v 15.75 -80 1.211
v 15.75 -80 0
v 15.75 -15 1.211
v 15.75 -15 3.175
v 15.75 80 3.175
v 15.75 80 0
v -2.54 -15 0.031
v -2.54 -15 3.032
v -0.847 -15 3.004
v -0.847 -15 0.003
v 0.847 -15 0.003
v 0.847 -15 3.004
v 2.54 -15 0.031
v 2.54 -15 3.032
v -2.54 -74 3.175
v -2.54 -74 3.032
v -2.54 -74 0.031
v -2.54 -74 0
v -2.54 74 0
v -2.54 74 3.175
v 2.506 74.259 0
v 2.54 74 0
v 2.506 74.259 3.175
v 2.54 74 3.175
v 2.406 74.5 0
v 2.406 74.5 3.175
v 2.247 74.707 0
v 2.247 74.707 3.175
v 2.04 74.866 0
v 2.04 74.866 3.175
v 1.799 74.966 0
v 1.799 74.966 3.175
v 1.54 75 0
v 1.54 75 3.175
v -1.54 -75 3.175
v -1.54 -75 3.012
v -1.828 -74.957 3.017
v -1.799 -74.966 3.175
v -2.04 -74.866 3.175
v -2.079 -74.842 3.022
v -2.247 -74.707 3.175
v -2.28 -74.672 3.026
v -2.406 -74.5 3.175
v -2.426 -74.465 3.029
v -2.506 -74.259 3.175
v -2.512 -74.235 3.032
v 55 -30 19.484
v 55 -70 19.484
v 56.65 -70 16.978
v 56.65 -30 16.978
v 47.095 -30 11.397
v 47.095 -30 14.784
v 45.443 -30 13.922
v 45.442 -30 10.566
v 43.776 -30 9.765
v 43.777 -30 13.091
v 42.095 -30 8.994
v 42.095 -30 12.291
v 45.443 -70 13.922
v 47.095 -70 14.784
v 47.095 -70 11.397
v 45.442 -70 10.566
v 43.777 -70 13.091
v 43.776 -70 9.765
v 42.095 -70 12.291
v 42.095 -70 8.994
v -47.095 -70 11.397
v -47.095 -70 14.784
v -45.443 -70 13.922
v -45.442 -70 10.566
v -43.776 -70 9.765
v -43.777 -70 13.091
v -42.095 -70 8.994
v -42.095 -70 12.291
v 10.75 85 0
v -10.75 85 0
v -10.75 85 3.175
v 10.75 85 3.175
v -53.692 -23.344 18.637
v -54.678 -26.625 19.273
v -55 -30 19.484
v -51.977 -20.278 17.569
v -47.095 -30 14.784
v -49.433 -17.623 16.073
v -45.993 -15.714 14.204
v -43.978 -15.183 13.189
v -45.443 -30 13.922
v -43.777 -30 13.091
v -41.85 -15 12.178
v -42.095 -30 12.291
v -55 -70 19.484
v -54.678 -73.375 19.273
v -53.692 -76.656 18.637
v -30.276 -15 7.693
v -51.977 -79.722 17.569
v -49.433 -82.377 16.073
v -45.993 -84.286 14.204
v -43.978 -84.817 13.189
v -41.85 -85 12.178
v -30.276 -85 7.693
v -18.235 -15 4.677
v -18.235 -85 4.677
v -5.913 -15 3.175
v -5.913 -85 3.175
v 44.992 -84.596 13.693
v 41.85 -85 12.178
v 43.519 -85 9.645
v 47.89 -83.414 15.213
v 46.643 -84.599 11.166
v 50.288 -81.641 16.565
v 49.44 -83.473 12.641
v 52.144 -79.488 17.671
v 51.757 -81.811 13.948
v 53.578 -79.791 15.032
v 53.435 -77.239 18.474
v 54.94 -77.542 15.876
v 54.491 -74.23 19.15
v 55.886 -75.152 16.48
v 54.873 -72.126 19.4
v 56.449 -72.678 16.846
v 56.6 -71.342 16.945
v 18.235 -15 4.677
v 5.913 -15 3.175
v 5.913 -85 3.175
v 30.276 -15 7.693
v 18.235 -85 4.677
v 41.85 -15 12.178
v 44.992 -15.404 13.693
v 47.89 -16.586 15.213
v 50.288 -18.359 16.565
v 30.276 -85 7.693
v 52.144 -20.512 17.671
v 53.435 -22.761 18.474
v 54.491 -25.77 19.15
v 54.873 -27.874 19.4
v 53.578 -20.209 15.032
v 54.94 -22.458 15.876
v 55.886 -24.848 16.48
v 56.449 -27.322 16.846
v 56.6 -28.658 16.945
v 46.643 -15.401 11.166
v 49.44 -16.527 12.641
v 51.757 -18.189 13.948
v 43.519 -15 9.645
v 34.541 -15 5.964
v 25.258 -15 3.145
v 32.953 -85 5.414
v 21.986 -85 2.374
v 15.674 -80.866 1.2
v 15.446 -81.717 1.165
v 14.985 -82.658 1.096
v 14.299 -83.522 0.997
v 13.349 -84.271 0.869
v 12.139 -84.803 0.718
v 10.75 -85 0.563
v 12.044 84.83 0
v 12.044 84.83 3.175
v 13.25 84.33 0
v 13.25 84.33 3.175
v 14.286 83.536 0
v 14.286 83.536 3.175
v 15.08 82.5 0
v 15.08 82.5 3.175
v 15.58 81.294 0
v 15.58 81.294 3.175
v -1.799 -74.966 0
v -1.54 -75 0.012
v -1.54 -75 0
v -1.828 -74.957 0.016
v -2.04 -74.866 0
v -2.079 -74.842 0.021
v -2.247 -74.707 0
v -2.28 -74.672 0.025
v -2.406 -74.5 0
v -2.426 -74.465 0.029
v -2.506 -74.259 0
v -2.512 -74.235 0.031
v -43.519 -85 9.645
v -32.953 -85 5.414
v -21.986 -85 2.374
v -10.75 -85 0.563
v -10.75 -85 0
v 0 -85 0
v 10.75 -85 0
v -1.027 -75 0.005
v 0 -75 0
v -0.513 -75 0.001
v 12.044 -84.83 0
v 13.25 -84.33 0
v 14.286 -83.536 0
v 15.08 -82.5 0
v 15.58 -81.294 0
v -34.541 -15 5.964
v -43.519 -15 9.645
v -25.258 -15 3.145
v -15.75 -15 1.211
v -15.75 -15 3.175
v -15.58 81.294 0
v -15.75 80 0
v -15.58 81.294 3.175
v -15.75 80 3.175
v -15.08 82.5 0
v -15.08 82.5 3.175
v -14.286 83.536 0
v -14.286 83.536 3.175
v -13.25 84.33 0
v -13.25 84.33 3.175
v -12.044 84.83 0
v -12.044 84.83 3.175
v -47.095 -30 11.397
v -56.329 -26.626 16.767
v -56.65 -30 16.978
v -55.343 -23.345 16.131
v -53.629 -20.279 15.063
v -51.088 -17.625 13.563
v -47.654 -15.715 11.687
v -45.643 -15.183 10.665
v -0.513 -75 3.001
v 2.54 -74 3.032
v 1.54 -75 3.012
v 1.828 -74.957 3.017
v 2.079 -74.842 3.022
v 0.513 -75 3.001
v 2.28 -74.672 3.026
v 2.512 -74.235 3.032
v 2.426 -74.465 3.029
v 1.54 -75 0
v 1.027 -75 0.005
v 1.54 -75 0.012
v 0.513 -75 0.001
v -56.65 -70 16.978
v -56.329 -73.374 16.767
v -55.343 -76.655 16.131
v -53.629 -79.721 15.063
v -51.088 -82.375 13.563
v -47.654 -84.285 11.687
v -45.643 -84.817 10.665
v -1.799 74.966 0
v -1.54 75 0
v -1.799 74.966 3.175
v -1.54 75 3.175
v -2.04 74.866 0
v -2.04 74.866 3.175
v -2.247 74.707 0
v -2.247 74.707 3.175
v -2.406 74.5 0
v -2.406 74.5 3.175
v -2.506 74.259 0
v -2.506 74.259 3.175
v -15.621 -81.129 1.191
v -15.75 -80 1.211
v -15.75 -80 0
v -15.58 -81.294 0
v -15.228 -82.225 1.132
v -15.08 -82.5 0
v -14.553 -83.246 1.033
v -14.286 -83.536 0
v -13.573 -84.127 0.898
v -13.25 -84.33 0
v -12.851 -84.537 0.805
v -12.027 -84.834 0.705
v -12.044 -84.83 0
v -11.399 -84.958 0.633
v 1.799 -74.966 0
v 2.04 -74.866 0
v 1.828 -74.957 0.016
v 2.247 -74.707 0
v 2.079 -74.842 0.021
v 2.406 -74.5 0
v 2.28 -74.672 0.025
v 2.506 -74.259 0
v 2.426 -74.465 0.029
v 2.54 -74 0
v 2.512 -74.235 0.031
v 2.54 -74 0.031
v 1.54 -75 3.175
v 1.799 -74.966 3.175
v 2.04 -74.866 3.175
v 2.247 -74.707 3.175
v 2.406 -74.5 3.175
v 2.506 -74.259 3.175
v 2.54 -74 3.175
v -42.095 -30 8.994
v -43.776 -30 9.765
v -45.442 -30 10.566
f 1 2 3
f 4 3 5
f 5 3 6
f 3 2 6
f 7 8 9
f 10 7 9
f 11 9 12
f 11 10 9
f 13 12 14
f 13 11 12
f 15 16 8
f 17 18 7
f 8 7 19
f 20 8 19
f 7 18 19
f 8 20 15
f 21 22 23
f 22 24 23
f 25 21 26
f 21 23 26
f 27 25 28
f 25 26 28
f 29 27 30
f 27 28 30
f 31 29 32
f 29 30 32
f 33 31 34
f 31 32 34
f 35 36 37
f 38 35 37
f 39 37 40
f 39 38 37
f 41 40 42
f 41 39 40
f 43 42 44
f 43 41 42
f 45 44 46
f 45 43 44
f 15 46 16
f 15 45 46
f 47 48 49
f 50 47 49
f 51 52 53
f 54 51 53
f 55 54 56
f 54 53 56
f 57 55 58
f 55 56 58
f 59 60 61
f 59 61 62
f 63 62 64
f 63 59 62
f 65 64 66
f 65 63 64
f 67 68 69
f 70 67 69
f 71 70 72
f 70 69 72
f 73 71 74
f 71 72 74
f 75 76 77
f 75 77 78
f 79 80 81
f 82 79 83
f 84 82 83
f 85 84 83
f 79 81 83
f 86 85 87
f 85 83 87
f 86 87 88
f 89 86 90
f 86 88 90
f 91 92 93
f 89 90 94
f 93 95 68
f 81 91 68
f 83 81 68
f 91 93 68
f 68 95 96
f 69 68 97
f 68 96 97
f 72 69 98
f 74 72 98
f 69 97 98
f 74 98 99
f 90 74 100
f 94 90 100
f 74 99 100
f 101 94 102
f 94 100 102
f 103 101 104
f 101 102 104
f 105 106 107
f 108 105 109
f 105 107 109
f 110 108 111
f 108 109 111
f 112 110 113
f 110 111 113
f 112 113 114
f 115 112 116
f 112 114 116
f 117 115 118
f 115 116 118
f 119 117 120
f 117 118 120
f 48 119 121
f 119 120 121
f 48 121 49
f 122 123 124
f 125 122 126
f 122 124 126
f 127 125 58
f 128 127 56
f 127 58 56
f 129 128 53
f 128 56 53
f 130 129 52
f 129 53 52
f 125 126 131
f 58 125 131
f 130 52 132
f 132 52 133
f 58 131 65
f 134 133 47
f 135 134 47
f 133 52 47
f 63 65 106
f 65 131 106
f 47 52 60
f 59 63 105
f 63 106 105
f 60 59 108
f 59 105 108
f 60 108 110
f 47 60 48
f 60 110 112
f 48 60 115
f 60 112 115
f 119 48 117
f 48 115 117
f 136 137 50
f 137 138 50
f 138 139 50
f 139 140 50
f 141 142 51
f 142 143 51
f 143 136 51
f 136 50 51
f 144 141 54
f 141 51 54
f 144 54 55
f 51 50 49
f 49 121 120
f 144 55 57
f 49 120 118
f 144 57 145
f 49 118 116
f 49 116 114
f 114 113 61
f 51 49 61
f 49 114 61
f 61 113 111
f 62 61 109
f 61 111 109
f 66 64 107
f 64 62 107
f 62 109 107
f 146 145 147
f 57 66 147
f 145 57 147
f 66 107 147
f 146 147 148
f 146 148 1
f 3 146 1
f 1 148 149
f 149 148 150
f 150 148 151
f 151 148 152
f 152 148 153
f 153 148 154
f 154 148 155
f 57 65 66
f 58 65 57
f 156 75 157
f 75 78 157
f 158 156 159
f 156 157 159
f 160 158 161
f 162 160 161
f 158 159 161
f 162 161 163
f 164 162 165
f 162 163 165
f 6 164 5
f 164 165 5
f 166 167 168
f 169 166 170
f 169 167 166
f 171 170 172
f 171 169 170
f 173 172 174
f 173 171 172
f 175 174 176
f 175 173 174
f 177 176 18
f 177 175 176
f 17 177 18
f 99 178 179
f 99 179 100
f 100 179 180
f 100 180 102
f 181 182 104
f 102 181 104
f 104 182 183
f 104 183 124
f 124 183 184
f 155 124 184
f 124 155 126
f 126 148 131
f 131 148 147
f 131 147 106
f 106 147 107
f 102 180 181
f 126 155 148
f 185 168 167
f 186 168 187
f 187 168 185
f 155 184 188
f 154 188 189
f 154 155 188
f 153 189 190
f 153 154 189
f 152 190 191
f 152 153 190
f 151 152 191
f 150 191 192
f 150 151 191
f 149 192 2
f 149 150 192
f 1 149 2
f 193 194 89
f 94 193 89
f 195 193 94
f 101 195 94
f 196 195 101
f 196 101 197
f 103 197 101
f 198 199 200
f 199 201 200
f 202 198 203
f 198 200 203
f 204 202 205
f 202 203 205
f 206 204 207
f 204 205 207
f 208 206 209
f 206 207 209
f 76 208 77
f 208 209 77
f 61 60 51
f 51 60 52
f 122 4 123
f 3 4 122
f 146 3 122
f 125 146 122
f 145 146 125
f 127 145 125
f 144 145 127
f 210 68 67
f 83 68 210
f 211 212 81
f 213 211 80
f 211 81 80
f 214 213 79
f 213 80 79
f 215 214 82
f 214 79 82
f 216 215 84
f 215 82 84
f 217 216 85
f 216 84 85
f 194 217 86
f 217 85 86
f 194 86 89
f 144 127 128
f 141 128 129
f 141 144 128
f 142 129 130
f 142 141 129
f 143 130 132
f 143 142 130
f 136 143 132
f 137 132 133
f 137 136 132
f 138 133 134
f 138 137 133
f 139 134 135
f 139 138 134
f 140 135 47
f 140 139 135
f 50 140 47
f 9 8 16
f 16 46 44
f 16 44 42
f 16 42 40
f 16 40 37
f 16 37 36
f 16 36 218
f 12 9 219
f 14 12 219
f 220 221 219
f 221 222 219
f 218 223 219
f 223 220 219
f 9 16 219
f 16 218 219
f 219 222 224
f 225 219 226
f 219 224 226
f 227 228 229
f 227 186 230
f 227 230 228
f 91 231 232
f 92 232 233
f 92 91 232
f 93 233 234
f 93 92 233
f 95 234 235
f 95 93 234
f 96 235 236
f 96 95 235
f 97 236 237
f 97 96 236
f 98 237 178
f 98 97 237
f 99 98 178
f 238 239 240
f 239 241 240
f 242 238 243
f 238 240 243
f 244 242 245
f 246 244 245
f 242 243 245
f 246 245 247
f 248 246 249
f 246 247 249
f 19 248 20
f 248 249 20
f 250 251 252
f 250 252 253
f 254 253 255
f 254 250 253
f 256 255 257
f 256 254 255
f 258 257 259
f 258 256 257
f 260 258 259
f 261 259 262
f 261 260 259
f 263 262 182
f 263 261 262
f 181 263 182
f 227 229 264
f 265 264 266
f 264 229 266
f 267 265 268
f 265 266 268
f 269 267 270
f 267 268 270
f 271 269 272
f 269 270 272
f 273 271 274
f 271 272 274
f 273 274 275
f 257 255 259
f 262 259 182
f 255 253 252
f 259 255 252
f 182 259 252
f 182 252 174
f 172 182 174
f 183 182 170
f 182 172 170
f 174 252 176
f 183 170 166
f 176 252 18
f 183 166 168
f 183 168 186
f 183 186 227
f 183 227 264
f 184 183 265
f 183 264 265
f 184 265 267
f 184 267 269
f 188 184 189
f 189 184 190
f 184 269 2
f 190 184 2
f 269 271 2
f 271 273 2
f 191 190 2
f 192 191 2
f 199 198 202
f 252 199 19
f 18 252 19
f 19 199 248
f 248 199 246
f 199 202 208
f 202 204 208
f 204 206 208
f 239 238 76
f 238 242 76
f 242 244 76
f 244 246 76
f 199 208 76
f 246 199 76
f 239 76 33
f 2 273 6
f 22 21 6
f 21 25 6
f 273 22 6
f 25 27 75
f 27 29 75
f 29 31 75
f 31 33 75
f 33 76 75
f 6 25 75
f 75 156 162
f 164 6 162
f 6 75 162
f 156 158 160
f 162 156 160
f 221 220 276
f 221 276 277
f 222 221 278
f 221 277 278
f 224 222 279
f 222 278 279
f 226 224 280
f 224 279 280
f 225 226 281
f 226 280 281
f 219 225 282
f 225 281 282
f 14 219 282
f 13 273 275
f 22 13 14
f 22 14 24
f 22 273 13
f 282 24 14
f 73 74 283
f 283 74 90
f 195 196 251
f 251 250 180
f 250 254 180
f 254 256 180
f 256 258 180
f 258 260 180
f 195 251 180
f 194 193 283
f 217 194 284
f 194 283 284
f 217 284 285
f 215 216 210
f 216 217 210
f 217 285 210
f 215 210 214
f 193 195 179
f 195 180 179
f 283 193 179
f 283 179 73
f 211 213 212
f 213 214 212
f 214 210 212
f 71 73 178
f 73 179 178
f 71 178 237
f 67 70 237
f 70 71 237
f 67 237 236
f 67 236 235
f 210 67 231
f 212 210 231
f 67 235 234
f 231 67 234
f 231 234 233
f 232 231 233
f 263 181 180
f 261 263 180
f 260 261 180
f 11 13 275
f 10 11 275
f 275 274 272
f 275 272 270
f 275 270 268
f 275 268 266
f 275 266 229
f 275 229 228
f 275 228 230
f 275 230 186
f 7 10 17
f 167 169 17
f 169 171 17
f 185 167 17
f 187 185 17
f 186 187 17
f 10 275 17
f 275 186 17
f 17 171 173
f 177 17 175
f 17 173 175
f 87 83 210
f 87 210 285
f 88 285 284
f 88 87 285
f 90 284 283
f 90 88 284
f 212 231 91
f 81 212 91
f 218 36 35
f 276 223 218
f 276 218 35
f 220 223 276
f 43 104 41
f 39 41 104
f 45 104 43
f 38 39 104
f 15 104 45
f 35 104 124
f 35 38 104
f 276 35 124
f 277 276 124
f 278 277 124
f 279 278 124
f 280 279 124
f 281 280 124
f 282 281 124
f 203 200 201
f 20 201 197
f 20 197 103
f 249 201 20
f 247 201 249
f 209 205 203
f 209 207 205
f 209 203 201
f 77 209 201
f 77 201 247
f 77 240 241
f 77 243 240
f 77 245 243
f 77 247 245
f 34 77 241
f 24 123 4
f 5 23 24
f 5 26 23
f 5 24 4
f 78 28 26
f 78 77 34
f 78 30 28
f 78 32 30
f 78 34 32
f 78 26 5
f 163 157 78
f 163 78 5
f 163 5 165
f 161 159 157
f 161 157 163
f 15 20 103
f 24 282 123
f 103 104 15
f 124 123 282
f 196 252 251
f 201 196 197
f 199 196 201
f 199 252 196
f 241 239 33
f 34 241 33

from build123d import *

# Parameters (mm, degrees)
SKETCH1_W           = 31.5
SKETCH1_H           = 170
SKETCH1_W_2         = 5.08
SKETCH1_H_2         = 150
BOSS_EXTRUDE1_DEPTH = 3.175
FILLET1_R           = 1
FILLET2_R           = 5
BOSS_EXTRUDE2_DEPTH = 70
FILLET3_R           = 15
SKETCH4_W           = 5
SKETCH4_H           = 40
CUT_EXTRUDE5_DEPTH  = 104.989569915


with BuildPart() as part:
    # Sketch1 → Boss-Extrude1 (new body)
    with BuildSketch(Plane.XY):
        Rectangle(SKETCH1_W, SKETCH1_H)
        Rectangle(SKETCH1_W_2, SKETCH1_H_2, mode=Mode.SUBTRACT)
    extrude(amount=BOSS_EXTRUDE1_DEPTH)

    # Fillet1
    fillet1_edges = [part.edges().sort_by_distance(p)[0] for p in [
        (2.54, 75, 1.5875),
        (-2.54, 75, 1.5875),
        (-2.54, -75, 1.5875),
        (2.54, -75, 1.5875),
    ]]
    fillet(fillet1_edges, radius=FILLET1_R)

    # Fillet2
    fillet2_edges = [part.edges().sort_by_distance(p)[0] for p in [
        (15.75, 85, 1.5875),
        (15.75, -85, 1.5875),
        (-15.75, -85, 1.5875),
        (-15.75, 85, 1.5875),
    ]]
    fillet(fillet2_edges, radius=FILLET2_R)

    # Sketch3 → Boss-Extrude2 (add)
    with BuildSketch(Plane(origin=(0, -85, 0), x_dir=(1, 0, 0), z_dir=(0, 1, 0))):
        with BuildLine():
            Line((-56.65, -16.978040594), (-55, -19.483534558))
            ThreePointArc((-55, -19.483534558), (0, -3), (55, -19.483534558))
            Line((55, -19.483534558), (56.65, -16.978040594))
            ThreePointArc((56.65, -16.978040594), (0, 0), (-56.65, -16.978040594))
        make_face()
    extrude(amount=BOSS_EXTRUDE2_DEPTH)

    # Fillet3
    fillet3_edges = [part.edges().sort_by_distance(p)[0] for p in [
        (55.825, -85, 18.230787576),
        (-55.825, -85, 18.230787576),
        (-55.825, -15, 18.230787576),
        (55.825, -15, 18.230787576),
    ]]
    fillet(fillet3_edges, radius=FILLET3_R)

    # Sketch4 → Cut-Extrude5 (cut, symmetric)
    with BuildSketch(Plane.XY):
        with Locations((-44.5945609, -50)):
            Rectangle(SKETCH4_W, SKETCH4_H)
    cut_extrude5 = extrude(amount=CUT_EXTRUDE5_DEPTH, both=True, mode=Mode.SUBTRACT)

    # Mirror1: Cut-Extrude5 across plane
    add(cut_extrude5.mirror(Plane(origin=(0, 0, 0), x_dir=(0, 0, 1), z_dir=(1, 0, 0))), mode=Mode.SUBTRACT)


solid = part.part
